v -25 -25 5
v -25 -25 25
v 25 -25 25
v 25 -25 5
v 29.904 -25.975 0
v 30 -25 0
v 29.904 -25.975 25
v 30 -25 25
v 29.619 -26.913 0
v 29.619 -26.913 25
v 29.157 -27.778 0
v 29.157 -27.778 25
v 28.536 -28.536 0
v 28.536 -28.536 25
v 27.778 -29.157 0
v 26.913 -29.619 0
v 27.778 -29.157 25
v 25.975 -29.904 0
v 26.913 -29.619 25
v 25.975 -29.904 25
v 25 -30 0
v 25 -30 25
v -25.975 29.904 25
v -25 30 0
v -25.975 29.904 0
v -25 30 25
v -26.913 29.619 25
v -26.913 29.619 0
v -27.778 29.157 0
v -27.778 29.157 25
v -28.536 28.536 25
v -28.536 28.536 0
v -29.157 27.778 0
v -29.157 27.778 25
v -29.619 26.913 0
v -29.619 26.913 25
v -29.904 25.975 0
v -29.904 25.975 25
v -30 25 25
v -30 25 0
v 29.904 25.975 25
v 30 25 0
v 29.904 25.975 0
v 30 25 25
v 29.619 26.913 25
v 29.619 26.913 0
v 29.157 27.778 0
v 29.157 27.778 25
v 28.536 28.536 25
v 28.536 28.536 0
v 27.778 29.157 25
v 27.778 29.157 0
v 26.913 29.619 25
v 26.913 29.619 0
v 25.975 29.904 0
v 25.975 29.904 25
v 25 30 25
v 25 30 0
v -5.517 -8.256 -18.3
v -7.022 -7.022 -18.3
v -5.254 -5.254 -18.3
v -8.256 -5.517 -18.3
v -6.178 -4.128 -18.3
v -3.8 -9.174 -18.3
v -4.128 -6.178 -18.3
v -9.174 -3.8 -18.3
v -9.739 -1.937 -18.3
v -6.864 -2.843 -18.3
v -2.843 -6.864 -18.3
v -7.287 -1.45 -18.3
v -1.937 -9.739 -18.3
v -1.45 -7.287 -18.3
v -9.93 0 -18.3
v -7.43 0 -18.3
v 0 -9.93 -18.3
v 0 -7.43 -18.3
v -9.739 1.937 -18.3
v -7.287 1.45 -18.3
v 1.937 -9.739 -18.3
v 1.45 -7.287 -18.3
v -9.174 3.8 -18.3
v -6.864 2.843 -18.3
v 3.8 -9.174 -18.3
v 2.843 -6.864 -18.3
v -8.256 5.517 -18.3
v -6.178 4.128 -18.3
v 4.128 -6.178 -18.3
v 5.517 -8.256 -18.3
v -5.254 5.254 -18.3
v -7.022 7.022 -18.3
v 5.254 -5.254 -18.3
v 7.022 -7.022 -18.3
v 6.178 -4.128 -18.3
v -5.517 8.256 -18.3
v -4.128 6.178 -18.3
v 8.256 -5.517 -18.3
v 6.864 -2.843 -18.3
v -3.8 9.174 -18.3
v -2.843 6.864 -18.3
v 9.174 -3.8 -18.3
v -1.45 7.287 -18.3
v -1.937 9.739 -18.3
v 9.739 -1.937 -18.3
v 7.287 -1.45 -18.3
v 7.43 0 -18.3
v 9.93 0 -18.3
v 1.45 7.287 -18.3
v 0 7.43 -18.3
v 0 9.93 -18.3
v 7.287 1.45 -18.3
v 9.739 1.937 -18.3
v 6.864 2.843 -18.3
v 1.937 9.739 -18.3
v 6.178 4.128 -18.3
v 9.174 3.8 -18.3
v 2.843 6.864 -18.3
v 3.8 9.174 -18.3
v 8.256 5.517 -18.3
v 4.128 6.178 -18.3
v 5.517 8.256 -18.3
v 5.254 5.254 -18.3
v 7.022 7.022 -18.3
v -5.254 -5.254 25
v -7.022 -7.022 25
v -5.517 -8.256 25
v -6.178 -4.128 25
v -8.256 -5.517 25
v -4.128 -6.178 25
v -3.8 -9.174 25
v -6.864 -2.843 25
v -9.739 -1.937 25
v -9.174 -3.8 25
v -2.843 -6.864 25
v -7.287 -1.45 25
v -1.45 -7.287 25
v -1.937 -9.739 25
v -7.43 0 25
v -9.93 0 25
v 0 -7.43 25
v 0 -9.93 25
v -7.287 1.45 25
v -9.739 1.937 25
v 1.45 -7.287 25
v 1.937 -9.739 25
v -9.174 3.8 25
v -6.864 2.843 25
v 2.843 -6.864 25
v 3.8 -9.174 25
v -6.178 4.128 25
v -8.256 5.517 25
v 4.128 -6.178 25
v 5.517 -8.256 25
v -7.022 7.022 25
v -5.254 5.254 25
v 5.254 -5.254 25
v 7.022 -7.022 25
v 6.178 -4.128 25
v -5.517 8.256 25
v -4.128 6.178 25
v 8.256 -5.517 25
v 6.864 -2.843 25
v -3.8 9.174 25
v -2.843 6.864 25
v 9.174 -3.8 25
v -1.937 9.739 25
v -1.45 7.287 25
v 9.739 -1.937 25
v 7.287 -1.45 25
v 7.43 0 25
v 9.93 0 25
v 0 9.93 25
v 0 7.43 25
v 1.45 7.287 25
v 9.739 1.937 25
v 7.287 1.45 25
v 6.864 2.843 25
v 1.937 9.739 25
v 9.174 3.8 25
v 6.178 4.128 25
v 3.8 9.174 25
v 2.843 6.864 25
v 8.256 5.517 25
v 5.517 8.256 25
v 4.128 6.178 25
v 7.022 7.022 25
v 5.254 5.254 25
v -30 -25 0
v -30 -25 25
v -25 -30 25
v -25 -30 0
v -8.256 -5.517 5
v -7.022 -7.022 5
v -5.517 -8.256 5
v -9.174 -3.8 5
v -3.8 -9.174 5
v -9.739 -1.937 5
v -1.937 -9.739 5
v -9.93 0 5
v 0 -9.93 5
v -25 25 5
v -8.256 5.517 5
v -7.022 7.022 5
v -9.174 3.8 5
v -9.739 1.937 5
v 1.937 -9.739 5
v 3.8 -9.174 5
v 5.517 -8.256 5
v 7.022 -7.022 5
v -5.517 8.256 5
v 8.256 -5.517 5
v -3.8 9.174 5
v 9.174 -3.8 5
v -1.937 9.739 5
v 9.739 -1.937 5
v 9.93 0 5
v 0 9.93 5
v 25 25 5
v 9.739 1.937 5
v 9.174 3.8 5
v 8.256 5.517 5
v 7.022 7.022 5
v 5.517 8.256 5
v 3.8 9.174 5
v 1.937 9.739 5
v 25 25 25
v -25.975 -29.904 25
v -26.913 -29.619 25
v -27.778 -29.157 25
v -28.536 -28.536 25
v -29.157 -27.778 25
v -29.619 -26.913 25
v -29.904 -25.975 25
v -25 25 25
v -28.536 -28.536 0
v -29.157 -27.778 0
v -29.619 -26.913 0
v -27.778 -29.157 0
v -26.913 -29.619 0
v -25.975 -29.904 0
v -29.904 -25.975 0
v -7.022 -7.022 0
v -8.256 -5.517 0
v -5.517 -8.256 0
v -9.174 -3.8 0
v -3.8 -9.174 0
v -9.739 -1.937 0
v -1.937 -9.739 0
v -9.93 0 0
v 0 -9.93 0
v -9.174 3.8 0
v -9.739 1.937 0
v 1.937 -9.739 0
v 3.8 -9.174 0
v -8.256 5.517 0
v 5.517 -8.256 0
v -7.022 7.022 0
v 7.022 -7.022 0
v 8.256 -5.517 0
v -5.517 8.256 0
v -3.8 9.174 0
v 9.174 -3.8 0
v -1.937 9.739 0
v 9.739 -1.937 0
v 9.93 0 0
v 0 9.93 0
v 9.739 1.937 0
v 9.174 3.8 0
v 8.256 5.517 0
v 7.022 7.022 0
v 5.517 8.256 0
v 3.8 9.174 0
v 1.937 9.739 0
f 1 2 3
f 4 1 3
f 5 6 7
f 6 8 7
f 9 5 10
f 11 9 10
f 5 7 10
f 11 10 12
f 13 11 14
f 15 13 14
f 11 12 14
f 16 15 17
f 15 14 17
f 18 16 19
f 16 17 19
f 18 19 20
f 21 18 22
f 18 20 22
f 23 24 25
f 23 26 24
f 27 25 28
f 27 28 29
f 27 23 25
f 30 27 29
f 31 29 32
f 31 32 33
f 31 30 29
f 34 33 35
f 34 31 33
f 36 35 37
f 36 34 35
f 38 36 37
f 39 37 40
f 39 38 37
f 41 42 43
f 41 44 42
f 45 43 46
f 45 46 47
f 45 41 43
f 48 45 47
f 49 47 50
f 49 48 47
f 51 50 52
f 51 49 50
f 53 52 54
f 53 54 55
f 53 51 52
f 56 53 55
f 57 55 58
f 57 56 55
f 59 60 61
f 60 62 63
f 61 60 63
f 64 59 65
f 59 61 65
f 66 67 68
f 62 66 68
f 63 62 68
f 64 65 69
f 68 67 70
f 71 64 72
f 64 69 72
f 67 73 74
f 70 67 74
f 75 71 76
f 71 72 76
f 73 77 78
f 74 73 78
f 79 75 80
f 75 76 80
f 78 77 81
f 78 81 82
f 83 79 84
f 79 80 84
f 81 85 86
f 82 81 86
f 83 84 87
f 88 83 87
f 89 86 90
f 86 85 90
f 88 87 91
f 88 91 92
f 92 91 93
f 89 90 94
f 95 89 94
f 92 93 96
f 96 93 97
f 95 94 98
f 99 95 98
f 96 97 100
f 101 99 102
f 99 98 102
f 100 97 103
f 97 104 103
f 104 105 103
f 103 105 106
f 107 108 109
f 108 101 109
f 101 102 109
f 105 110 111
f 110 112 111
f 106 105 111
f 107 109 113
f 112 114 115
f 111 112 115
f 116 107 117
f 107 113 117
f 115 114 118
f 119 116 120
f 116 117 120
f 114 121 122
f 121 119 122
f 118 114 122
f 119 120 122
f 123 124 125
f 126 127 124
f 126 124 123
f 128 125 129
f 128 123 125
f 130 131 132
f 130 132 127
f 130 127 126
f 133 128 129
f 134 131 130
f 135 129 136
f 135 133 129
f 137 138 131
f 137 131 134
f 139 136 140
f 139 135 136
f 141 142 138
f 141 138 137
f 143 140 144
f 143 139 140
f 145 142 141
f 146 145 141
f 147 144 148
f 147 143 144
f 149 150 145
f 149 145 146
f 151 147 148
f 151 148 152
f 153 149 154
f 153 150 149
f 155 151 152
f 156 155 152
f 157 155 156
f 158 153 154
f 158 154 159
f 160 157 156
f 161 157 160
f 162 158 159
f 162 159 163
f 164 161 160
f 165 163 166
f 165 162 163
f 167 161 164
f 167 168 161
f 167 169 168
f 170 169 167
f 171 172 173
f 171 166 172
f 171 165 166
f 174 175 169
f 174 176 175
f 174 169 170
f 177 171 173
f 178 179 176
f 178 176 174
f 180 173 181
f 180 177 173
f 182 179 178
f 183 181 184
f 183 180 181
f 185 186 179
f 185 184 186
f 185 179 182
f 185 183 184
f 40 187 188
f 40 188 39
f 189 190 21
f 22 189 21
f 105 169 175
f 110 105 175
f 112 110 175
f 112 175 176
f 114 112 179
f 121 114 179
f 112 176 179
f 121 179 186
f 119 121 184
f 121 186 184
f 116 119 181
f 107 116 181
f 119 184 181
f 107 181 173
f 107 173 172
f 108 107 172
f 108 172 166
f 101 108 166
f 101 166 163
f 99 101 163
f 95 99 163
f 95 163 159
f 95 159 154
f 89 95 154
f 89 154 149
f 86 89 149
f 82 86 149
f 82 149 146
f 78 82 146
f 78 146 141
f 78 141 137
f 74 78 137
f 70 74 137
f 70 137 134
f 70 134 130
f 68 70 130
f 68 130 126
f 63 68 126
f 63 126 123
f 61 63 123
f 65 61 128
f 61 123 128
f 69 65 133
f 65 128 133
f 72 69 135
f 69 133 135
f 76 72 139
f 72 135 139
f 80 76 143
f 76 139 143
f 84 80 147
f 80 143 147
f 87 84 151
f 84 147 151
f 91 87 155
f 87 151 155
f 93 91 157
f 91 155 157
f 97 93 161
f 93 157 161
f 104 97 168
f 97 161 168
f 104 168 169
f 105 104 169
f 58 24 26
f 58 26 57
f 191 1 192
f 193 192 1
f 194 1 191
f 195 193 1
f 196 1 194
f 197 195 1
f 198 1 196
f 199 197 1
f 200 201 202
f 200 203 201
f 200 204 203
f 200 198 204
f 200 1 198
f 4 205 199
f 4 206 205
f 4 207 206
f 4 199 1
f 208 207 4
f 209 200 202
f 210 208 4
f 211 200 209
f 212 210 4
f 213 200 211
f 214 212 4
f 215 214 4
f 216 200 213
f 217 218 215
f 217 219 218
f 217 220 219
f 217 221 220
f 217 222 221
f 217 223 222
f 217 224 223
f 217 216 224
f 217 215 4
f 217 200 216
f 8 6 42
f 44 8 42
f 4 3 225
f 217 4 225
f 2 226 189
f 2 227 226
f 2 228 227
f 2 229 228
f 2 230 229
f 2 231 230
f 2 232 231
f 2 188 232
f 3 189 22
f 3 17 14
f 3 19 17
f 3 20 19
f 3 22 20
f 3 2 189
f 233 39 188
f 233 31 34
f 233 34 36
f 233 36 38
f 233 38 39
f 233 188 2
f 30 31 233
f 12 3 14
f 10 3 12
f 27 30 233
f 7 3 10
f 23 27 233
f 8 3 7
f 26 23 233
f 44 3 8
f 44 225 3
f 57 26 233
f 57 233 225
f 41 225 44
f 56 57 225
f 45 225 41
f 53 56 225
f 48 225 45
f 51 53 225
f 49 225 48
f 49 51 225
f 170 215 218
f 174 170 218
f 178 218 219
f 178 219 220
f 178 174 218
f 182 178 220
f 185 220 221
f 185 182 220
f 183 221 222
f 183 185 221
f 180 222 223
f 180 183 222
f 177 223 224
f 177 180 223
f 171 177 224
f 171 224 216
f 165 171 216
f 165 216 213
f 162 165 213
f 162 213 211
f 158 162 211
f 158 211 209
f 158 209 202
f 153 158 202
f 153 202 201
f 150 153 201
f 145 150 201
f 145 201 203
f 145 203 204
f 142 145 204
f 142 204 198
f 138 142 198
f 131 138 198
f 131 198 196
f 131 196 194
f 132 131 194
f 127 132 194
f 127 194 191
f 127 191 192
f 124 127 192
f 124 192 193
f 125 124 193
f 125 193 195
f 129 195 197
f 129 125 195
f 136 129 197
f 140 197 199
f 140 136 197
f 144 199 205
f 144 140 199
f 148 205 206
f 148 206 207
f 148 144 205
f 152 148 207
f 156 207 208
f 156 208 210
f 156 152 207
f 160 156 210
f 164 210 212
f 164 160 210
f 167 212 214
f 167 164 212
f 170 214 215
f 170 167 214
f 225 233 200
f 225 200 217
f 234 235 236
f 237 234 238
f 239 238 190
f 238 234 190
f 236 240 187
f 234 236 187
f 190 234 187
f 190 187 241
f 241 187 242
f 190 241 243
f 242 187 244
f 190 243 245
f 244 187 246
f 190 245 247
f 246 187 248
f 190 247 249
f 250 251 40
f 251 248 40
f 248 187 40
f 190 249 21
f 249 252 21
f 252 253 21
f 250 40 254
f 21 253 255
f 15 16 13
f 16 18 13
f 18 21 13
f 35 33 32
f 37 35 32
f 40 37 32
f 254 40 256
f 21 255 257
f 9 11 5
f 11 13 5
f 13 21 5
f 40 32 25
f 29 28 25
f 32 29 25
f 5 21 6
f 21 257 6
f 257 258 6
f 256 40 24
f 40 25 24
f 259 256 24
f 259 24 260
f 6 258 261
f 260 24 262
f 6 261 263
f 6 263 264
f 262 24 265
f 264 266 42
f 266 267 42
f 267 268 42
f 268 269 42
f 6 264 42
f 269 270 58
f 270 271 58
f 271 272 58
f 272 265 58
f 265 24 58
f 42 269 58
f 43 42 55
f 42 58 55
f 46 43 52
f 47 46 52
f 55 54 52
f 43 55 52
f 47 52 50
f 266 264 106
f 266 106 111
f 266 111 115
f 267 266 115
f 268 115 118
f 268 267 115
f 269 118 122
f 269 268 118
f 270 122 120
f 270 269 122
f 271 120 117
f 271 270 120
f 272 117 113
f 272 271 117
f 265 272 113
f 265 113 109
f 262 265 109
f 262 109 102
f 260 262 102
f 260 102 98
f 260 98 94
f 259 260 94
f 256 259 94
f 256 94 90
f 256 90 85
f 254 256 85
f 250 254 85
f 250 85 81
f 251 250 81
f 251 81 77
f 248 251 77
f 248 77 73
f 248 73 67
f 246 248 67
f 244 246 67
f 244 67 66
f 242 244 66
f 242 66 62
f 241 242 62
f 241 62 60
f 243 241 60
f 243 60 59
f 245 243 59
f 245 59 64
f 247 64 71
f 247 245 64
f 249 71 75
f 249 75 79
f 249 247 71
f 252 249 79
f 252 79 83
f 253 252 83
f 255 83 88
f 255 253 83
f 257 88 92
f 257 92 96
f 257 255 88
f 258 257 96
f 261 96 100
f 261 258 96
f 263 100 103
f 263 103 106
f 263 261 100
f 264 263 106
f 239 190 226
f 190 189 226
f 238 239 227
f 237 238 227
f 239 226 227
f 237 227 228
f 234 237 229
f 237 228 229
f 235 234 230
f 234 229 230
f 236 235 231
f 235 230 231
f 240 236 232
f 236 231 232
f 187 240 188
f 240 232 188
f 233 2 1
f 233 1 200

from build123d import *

# Parameters (mm, degrees)
F0_W     = 60
F0_H     = 60
F1_DEPTH = 25
F2_W     = 50
F2_H     = 50
F3_DEPTH = 20
F4_R     = 9.93
F4_R_2   = 7.43
F5_DEPTH = 43.3
F6_R     = 7.43
F7_DEPTH = 56.5
F8_R     = 5


with BuildPart() as f1:
    # F0 (on Top) → F1 (new body)
    with BuildSketch(Plane.XY):
        Rectangle(F0_W, F0_H)
    extrude(amount=F1_DEPTH)

    # F2 (on face) → F3 (cut)
    with BuildSketch(Plane.XY.offset(25)):
        Rectangle(F2_W, F2_H)
    extrude(amount=-F3_DEPTH, mode=Mode.SUBTRACT)

    # F4 (on face) → F5 (join)
    with BuildSketch(Plane.XY.offset(25)):
        Circle(F4_R)
        Circle(F4_R_2, mode=Mode.SUBTRACT)
    extrude(amount=-F5_DEPTH)

    # F6 (on face) → F7 (cut)
    with BuildSketch(Plane.XY.offset(25)):
        Circle(F6_R)
    extrude(amount=-F7_DEPTH, mode=Mode.SUBTRACT)

    # F8
    f8_edges = [f1.edges().sort_by_distance(p)[0] for p in [
        (-30, -30, 12.5),
        (30, -30, 12.5),
        (30, 30, 12.5),
        (-30, 30, 12.5),
    ]]
    fillet(f8_edges, radius=F8_R)


solid = f1.part
